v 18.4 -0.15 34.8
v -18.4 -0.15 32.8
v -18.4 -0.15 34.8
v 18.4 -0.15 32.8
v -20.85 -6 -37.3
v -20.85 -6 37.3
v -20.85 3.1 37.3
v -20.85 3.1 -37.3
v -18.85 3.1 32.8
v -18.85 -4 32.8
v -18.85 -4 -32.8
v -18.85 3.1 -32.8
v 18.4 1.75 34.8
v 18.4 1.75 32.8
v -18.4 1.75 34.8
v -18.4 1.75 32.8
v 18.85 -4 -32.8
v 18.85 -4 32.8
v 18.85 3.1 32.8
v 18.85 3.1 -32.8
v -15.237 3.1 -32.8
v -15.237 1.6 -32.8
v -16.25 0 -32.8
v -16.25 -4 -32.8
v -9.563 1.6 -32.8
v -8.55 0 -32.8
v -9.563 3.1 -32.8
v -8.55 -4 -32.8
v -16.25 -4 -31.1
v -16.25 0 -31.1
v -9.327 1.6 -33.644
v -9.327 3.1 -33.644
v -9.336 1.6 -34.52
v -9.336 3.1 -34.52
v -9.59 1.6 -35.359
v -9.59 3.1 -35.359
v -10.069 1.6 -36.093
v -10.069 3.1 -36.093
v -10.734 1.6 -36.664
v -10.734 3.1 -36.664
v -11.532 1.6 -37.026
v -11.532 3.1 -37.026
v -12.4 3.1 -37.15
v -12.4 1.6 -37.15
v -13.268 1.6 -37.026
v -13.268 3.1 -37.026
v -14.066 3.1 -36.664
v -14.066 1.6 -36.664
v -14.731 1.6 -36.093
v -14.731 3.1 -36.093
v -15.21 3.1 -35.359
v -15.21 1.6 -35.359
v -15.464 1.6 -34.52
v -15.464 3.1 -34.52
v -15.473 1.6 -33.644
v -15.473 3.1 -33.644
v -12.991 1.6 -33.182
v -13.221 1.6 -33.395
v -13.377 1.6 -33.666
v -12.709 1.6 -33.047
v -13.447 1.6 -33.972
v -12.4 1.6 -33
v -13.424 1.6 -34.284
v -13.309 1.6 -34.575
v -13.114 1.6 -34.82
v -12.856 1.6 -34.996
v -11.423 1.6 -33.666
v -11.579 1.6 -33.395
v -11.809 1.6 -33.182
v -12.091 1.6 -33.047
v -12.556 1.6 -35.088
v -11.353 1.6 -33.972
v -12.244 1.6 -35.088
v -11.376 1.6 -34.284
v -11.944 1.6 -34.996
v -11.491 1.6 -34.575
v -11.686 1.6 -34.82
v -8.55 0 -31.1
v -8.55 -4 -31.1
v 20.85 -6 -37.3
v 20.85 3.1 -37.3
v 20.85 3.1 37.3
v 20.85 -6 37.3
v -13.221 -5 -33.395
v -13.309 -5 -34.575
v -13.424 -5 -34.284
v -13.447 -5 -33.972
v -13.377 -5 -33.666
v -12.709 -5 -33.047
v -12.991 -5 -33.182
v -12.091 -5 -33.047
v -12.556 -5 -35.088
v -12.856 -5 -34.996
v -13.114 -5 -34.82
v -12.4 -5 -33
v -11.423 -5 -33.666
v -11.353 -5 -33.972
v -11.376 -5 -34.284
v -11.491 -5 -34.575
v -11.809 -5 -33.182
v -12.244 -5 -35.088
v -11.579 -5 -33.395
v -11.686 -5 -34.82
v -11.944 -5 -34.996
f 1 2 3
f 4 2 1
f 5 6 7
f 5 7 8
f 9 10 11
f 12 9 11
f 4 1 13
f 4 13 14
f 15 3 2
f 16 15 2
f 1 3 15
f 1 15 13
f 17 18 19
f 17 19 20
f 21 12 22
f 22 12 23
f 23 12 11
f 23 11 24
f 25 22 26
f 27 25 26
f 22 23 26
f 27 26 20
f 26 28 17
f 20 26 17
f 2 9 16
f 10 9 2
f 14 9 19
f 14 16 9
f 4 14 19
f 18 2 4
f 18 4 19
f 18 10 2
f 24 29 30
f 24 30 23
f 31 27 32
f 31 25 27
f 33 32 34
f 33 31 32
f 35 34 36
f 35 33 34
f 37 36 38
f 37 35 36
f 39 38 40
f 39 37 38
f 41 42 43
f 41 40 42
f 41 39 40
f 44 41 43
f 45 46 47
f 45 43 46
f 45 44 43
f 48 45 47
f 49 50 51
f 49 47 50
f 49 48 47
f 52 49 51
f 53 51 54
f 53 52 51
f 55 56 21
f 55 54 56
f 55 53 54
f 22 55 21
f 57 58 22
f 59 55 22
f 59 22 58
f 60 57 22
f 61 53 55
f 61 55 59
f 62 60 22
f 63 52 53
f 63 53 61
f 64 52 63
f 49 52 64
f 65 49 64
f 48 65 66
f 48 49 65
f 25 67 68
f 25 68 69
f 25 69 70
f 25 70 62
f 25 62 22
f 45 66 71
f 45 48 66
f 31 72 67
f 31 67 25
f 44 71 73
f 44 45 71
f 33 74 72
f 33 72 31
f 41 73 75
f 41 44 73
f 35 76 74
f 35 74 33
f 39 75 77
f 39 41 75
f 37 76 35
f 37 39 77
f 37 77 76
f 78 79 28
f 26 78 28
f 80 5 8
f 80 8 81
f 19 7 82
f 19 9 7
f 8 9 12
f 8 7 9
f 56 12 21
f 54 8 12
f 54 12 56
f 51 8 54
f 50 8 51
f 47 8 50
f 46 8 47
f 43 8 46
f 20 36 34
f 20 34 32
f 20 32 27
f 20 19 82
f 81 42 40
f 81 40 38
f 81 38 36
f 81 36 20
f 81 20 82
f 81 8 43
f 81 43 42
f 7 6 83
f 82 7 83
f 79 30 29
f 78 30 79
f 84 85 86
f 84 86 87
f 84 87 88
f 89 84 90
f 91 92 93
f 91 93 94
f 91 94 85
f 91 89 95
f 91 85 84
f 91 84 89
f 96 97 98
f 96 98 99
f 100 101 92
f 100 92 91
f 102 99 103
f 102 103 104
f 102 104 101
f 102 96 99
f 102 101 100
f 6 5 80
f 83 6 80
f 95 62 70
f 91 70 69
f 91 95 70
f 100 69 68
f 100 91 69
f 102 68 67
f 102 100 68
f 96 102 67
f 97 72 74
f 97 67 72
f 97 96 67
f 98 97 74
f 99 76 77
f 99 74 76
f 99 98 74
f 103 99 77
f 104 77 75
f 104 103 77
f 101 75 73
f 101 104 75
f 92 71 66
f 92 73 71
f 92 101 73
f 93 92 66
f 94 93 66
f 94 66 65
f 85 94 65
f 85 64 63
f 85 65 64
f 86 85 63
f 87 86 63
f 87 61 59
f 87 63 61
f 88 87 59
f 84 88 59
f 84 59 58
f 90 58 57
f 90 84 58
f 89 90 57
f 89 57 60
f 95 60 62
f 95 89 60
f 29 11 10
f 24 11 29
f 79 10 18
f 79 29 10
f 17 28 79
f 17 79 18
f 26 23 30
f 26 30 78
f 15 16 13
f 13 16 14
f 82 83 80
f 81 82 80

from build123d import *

# Parameters (mm, degrees)
BOSS_EXTRUDE1_DEPTH      = 3.1
BOSS_EXTRUDE1_DEPTH_BACK = 6
SKETCH1_W                = 41.7
SKETCH1_H                = 74.6
CUT_EXTRUDE1_DEPTH       = 44.151042861
CUT_EXTRUDE1_DEPTH_BACK  = 4
SKETCH2_W                = 37.7
SKETCH2_H                = 65.6
CUT_EXTRUDE2_DEPTH       = 1.75
CUT_EXTRUDE2_DEPTH_BACK  = 0.15
SKETCH3_W                = 36.8
SKETCH3_H                = 2
SKETCH4_W                = 7.7
SKETCH4_H                = 1.7
BOSS_EXTRUDE2_DEPTH      = 4
CUT_EXTRUDE3_START       = 1.6
SKETCH5_R                = 3.1
CUT_EXTRUDE3_DEPTH       = 42.551042861
CUT_EXTRUDE4_DEPTH       = 44.151042861
CUT_EXTRUDE4_DEPTH_BACK  = 5
SKETCH6_R                = 1.05


with BuildPart() as part:
    # Sketch1 → Boss-Extrude1 (new, two sides: drawn at the far end of the back side and taken through both)
    with BuildSketch(Plane(origin=(0, 0, 0), x_dir=(1, 0, 0), z_dir=(0, 1, 0)).offset(-BOSS_EXTRUDE1_DEPTH_BACK)):
        Rectangle(SKETCH1_W, SKETCH1_H)
    extrude(amount=BOSS_EXTRUDE1_DEPTH + BOSS_EXTRUDE1_DEPTH_BACK)

    # Sketch2 → Cut-Extrude1 (cut, two sides: drawn at the far end of the back side and taken through both)
    with BuildSketch(Plane(origin=(0, 0, 0), x_dir=(1, 0, 0), z_dir=(0, 1, 0)).offset(-CUT_EXTRUDE1_DEPTH_BACK)):
        Rectangle(SKETCH2_W, SKETCH2_H)
    extrude(amount=CUT_EXTRUDE1_DEPTH + CUT_EXTRUDE1_DEPTH_BACK, mode=Mode.SUBTRACT)

    # Sketch3 → Cut-Extrude2 (cut, two sides: drawn at the far end of the back side and taken through both)
    with BuildSketch(Plane(origin=(0, 0, 0), x_dir=(1, 0, 0), z_dir=(0, 1, 0)).offset(-CUT_EXTRUDE2_DEPTH_BACK)):
        with Locations((0, -33.8)):
            Rectangle(SKETCH3_W, SKETCH3_H)
    extrude(amount=CUT_EXTRUDE2_DEPTH + CUT_EXTRUDE2_DEPTH_BACK, mode=Mode.SUBTRACT)

    # Sketch4 → Boss-Extrude2 (add)
    with BuildSketch(Plane(origin=(0, 0, 0), x_dir=(1, 0, 0), z_dir=(0, 1, 0))):
        with Locations((-12.4, 31.95)):
            Rectangle(SKETCH4_W, SKETCH4_H)
    extrude(amount=-BOSS_EXTRUDE2_DEPTH)

    # Sketch5 → Cut-Extrude3 (cut, through all)
    with BuildSketch(Plane(origin=(0, 0, 0), x_dir=(1, 0, 0), z_dir=(0, 1, 0)).offset(CUT_EXTRUDE3_START)):
        with Locations((-12.4, 34.05)):
            Circle(SKETCH5_R)
    extrude(amount=CUT_EXTRUDE3_DEPTH, mode=Mode.SUBTRACT)

    # Sketch6 → Cut-Extrude4 (cut, two sides: drawn at the far end of the back side and taken through both)
    with BuildSketch(Plane(origin=(0, 0, 0), x_dir=(1, 0, 0), z_dir=(0, 1, 0)).offset(-CUT_EXTRUDE4_DEPTH_BACK)):
        with Locations(Location((-12.4, 34.05, 0), (0, 0, 270))):
            Circle(SKETCH6_R)
    extrude(amount=CUT_EXTRUDE4_DEPTH + CUT_EXTRUDE4_DEPTH_BACK, mode=Mode.SUBTRACT)


solid = part.part
